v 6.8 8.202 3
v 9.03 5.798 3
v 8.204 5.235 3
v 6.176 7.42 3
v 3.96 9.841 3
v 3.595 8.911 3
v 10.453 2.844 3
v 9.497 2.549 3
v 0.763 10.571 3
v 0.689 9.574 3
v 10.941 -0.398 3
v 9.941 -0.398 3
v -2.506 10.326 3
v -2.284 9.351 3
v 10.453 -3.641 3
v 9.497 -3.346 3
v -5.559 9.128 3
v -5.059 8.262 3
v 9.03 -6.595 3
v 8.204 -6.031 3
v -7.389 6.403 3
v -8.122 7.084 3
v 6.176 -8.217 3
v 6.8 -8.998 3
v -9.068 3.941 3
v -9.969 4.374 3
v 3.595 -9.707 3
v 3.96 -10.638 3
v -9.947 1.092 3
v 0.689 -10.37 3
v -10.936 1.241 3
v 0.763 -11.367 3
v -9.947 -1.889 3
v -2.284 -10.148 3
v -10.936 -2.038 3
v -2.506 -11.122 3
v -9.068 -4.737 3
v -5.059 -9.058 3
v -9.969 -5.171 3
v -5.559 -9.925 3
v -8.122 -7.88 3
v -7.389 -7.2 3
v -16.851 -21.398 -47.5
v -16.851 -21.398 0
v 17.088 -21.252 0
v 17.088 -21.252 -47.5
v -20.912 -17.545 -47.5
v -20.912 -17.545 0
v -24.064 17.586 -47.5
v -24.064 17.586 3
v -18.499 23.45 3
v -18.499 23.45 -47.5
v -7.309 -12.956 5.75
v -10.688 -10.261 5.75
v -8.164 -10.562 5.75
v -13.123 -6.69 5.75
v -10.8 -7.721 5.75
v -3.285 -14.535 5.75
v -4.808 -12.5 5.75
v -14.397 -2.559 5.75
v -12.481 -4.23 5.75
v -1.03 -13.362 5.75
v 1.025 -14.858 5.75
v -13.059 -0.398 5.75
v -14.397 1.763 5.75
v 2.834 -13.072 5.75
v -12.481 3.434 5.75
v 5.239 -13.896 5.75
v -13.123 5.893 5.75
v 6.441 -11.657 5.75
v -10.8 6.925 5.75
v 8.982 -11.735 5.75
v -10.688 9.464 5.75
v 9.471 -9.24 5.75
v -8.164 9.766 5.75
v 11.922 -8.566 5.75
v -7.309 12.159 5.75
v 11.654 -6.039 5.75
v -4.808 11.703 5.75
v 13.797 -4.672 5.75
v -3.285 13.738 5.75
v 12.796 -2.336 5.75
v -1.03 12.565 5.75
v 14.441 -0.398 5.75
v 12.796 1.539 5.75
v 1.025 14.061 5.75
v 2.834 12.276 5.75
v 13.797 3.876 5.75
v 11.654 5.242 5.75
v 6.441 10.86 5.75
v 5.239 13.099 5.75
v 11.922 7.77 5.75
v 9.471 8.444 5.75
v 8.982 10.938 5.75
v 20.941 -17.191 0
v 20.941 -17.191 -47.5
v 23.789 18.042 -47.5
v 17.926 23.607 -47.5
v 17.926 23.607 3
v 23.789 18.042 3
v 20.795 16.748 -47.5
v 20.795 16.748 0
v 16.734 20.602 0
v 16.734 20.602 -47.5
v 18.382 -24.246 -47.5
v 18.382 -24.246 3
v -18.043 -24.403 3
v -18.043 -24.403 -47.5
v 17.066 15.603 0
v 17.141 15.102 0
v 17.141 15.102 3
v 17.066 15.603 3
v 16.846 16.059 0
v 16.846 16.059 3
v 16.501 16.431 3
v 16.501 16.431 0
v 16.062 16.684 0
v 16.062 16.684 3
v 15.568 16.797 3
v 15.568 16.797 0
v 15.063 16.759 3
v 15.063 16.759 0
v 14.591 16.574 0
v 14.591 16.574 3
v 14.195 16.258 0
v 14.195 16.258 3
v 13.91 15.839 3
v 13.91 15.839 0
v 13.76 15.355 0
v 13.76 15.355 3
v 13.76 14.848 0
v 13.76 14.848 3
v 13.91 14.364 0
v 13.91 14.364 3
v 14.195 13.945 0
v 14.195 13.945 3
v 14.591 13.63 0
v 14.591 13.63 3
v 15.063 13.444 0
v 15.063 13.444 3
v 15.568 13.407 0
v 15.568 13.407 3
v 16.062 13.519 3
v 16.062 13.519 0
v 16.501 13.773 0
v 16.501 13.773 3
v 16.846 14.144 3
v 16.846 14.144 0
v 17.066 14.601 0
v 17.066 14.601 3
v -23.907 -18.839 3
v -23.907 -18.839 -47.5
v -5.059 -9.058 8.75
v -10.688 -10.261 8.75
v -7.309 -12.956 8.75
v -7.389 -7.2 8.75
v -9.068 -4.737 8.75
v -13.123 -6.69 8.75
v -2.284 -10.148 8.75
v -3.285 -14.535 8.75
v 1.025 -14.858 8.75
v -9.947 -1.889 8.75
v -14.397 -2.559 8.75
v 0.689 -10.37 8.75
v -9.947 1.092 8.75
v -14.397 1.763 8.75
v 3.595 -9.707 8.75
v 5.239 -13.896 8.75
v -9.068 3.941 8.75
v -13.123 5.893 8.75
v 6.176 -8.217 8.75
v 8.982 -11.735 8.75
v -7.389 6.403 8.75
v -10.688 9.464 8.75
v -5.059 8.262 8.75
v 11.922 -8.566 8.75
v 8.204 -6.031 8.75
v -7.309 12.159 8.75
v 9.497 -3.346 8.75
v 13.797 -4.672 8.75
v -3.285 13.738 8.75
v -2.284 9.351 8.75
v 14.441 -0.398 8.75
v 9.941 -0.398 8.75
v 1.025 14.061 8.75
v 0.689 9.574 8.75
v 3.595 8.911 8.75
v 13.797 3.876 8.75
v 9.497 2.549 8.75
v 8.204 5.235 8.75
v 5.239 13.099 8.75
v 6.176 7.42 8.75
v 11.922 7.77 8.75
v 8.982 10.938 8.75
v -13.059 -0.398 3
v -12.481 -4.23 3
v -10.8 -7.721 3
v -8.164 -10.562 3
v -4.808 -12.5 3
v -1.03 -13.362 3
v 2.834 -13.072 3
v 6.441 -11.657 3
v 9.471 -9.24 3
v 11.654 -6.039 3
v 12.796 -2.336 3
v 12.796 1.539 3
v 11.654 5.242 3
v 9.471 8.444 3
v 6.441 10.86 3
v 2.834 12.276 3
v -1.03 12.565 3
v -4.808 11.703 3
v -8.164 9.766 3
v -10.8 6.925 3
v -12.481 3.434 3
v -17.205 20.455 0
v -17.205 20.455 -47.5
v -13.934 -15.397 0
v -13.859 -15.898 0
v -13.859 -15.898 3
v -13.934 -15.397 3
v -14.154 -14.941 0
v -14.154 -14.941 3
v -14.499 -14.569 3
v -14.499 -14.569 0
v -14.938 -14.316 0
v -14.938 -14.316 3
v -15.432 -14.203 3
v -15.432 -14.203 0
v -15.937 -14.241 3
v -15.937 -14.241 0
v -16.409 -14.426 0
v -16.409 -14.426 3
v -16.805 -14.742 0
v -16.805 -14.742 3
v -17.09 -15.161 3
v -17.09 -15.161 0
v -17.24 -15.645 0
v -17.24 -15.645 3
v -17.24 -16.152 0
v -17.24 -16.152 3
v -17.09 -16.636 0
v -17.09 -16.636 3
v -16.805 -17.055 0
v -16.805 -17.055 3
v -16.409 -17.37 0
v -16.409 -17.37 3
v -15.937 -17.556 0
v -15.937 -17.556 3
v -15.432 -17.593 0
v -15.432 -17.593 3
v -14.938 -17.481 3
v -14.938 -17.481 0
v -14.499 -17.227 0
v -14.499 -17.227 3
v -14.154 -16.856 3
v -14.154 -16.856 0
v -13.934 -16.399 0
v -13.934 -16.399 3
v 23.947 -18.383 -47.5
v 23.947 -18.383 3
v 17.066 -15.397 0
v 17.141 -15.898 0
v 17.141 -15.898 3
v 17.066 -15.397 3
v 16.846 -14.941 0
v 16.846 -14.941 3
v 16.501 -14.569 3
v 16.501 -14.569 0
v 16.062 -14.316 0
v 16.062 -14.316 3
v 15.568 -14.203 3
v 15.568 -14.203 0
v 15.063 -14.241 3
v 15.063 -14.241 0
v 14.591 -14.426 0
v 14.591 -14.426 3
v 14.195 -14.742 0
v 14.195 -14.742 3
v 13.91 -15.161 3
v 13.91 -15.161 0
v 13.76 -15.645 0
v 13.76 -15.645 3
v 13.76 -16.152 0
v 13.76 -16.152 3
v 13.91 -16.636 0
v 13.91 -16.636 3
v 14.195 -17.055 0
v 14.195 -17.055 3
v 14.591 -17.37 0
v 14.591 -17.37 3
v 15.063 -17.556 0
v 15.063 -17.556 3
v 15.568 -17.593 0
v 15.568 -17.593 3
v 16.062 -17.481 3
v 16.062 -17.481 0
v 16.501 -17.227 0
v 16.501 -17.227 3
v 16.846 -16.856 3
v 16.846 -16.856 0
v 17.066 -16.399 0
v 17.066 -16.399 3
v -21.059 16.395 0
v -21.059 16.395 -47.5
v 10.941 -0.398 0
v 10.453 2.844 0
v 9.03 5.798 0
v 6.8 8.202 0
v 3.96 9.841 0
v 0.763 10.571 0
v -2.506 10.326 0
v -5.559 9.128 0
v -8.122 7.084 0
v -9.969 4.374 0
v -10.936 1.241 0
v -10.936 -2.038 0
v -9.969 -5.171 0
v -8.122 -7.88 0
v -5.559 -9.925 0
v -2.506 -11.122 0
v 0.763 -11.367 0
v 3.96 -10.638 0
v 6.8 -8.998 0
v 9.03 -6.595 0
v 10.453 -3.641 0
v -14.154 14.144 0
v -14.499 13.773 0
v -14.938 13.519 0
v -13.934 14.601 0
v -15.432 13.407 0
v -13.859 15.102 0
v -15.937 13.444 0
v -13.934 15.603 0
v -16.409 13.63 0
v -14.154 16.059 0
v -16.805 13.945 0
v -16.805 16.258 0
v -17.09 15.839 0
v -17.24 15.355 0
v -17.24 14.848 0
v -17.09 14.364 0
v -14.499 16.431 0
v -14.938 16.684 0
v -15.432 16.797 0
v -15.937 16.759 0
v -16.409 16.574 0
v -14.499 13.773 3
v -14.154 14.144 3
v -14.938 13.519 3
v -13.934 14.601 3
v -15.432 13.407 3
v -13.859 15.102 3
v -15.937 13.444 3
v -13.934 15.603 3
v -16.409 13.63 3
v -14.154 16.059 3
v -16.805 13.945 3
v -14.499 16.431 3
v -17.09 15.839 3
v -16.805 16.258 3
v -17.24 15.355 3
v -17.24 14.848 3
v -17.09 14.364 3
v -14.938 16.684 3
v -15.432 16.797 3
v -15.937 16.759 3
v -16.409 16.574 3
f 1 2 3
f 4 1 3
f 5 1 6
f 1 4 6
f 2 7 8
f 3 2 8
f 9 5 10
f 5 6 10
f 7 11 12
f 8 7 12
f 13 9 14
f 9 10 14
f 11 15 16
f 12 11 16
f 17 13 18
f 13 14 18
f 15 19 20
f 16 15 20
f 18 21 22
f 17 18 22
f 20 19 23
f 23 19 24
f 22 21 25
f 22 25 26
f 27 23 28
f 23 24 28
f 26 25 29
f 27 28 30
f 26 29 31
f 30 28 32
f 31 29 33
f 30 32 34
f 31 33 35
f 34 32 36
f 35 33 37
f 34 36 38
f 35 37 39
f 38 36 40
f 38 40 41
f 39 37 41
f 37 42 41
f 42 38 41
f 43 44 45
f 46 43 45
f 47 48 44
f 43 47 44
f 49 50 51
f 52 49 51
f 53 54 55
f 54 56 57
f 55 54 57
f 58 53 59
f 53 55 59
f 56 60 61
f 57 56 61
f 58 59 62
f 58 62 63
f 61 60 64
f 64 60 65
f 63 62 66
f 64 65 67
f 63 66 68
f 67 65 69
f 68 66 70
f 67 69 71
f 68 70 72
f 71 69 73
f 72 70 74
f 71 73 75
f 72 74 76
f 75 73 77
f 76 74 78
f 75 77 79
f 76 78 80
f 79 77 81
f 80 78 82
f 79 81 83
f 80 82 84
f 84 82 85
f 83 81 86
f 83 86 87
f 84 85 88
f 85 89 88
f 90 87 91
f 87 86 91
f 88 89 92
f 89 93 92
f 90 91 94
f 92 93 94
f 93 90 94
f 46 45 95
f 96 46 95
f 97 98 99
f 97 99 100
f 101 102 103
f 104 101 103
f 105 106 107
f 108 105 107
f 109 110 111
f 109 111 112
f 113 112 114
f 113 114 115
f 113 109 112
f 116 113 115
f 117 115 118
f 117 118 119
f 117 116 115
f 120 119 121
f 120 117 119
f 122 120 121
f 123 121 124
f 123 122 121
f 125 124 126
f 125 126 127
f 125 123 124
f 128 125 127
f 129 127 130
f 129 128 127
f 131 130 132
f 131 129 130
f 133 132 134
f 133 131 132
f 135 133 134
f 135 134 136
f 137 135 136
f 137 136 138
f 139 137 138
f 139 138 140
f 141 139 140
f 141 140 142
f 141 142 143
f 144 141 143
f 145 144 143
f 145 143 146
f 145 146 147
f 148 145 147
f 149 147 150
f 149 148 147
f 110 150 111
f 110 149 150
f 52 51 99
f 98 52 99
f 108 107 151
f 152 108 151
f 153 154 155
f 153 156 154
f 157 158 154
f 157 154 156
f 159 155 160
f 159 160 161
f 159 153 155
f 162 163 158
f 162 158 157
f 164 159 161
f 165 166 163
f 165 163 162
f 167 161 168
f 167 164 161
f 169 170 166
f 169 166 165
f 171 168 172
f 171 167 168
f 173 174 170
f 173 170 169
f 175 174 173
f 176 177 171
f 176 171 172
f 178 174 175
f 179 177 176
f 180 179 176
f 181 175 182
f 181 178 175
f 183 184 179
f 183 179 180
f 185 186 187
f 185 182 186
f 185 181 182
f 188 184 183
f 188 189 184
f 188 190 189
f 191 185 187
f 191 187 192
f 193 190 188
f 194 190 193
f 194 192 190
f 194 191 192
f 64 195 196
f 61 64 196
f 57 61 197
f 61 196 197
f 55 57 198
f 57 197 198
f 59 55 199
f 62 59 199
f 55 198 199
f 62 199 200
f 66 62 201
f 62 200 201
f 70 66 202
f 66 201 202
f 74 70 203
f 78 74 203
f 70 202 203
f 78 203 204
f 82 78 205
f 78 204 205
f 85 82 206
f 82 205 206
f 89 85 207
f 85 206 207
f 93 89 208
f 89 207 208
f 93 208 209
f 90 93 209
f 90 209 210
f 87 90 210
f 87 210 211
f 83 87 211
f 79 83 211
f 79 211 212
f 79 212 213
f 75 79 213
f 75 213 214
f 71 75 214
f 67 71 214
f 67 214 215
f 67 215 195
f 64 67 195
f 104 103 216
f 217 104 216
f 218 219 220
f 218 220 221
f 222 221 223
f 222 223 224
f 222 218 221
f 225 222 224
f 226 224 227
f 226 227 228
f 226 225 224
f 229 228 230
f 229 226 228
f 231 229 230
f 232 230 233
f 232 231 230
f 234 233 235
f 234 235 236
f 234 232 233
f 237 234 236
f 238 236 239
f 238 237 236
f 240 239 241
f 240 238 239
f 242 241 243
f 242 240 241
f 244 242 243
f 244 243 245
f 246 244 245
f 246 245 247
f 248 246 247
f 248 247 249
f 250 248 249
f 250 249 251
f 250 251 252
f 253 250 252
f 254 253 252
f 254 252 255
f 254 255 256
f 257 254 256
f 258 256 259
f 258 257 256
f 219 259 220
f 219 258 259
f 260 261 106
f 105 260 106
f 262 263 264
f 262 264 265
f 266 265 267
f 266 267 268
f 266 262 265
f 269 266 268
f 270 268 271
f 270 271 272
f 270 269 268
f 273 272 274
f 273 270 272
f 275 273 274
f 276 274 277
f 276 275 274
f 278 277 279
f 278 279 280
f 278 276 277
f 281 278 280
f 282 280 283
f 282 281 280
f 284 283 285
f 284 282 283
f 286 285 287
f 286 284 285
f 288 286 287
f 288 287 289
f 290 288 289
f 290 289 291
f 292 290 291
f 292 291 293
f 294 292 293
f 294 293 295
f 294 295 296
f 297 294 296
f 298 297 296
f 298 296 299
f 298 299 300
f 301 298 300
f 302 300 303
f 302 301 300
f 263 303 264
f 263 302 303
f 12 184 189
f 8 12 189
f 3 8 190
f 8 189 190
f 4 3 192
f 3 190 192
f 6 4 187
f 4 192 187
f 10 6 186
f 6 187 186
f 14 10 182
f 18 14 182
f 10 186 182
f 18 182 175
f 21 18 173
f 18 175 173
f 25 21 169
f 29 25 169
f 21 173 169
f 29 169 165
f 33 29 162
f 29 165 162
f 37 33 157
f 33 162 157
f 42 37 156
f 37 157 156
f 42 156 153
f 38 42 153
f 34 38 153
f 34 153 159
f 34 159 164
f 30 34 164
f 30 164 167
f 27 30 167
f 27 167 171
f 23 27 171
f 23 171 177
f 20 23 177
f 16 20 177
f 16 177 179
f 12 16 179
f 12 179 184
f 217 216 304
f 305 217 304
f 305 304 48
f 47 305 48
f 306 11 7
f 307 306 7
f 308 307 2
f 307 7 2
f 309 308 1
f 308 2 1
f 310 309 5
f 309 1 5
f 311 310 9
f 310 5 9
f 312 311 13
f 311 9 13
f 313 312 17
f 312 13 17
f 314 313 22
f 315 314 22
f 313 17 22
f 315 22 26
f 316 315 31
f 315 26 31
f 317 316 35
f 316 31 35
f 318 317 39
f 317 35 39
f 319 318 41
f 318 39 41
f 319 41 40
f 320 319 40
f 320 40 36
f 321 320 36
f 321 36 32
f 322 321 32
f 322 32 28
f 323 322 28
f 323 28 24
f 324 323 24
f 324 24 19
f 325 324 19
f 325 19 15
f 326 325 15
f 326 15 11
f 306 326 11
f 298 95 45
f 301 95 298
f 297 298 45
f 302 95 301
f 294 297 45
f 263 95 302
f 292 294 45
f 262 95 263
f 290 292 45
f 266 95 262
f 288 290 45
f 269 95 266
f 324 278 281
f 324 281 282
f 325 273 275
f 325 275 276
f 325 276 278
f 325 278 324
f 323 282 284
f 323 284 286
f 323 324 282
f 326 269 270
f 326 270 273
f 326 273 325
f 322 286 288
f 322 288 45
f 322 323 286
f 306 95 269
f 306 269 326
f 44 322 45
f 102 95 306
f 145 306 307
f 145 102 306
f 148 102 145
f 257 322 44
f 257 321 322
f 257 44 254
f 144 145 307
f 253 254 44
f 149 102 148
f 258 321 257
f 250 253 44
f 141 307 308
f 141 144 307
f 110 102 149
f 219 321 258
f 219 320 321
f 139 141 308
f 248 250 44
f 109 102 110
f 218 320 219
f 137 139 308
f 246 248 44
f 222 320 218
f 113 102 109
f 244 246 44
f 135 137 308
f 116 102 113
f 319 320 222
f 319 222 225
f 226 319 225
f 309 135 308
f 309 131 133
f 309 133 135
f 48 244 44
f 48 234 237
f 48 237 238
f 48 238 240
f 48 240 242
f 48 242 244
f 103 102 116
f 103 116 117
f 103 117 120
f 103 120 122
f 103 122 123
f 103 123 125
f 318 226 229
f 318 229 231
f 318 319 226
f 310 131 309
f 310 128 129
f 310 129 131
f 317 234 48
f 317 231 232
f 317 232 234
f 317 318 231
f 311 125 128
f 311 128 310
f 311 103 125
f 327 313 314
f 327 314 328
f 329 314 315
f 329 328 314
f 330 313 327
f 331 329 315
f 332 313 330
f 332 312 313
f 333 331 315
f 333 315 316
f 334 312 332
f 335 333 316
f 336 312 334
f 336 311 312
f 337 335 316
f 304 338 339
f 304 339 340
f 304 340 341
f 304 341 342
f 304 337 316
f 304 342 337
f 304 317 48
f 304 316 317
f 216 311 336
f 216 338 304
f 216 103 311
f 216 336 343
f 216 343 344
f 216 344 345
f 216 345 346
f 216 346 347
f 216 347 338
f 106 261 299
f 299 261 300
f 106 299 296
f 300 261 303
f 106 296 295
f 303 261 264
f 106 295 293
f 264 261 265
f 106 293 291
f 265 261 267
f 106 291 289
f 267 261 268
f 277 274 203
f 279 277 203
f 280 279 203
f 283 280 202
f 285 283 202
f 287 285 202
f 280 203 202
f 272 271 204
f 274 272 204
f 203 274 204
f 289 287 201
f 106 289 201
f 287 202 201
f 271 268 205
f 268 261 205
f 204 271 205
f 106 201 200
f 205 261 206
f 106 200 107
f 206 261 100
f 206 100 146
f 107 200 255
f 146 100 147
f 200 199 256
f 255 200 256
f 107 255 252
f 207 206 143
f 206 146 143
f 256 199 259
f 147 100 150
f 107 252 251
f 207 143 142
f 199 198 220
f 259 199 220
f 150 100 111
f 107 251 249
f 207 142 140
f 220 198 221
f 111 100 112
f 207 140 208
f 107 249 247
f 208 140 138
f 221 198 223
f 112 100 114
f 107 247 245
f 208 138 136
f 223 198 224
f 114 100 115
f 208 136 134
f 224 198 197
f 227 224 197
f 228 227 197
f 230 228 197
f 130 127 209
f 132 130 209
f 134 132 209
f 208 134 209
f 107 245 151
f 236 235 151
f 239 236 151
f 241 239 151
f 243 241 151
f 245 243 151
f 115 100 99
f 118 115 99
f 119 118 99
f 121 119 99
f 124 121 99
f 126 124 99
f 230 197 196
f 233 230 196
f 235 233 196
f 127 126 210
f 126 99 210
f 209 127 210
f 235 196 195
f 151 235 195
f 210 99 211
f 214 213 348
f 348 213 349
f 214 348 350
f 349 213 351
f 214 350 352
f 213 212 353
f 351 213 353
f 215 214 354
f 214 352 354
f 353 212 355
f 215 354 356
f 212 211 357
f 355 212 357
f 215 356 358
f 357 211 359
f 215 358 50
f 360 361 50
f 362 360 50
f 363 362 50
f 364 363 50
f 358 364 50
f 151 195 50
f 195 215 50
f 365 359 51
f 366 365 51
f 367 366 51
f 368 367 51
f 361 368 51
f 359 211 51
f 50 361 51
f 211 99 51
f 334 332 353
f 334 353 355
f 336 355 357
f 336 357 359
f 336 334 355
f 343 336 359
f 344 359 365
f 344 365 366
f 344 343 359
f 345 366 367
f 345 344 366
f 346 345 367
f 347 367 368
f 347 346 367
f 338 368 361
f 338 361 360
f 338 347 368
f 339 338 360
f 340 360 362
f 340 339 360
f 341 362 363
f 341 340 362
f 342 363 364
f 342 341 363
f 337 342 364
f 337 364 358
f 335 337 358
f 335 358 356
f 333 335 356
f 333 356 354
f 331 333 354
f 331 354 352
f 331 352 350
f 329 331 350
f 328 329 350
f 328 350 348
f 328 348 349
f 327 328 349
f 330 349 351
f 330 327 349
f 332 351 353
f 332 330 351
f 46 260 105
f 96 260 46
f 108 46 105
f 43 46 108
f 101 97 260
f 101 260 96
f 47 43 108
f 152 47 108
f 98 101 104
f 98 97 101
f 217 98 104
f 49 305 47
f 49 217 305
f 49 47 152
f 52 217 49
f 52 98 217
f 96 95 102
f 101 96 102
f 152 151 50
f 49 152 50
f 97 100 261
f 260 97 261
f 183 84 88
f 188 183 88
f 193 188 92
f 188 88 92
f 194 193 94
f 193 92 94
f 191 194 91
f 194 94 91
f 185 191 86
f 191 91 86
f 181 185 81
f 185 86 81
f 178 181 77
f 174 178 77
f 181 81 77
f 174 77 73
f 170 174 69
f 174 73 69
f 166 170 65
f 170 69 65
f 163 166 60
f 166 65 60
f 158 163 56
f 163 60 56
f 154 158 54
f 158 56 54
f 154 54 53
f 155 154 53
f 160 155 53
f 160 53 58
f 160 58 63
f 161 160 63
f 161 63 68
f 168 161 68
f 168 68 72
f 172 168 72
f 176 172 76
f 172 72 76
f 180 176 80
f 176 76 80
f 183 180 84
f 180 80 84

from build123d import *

# Parameters (mm, degrees)
CROQUIS1_R              = 1.7
SALIENTE_EXTRUIR1_DEPTH = 3
CROQUIS17_R             = 11
CORTAR_EXTRUIR7_DEPTH   = 30
CROQUIS19_R             = 13
SALIENTE_EXTRUIR3_DEPTH = 7.25
CROQUIS20_R             = 10
CORTAR_EXTRUIR8_DEPTH   = 14
CORTAR_EXTRUIR9_START   = -1.5
CROQUIS22_R             = 13
CORTAR_EXTRUIR9_DEPTH   = 1.5
SALIENTE_EXTRUIR4_START = -3
CROQUIS23_R             = 14.5
CROQUIS23_R_2           = 13
SALIENTE_EXTRUIR4_DEPTH = 3
SALIENTE_EXTRUIR6_DEPTH = 50.5


with BuildPart() as part:
    # Croquis1 → Saliente-Extruir1 (new body)
    with BuildSketch(Plane.XY):
        Polygon((-20.912159123, -17.544678887), (-21.058605733, 16.394660941), (-17.205052342, 20.455321113), (16.734287486, 20.601767722), (20.794947658, 16.748214331), (20.941394267, -17.191125497), (17.087840877, -21.251785669), (-16.851498951, -21.398232278), align=None)
        with Locations((-15.558605733, 15.101767722)):
            Circle(CROQUIS1_R, mode=Mode.SUBTRACT)
        with Locations((15.441394267, 15.101767722)):
            Circle(CROQUIS1_R, mode=Mode.SUBTRACT)
        with Locations((15.441394267, -15.898232278)):
            Circle(CROQUIS1_R, mode=Mode.SUBTRACT)
        with Locations((-15.558605733, -15.898232278)):
            Circle(CROQUIS1_R, mode=Mode.SUBTRACT)
    extrude(amount=SALIENTE_EXTRUIR1_DEPTH)

    # Croquis17 → Cortar-Extruir7 (cut)
    with BuildSketch(Plane.XY.offset(3)):
        with Locations((-0.058605733, -0.398232278)):
            Circle(CROQUIS17_R)
    extrude(amount=-CORTAR_EXTRUIR7_DEPTH, mode=Mode.SUBTRACT)

    # Croquis19 → Saliente-Extruir3 (add)
    with BuildSketch(Plane.XY.offset(3)):
        with Locations(Location((-0.058605733, -0.398232278, 0), (0, 0, 180))):
            Circle(CROQUIS19_R)
    extrude(amount=SALIENTE_EXTRUIR3_DEPTH)

    # Croquis20 → Cortar-Extruir8 (cut)
    with BuildSketch(Plane.XY.offset(10.25)):
        with Locations((-0.058605733, -0.398232278)):
            Circle(CROQUIS20_R)
    extrude(amount=-CORTAR_EXTRUIR8_DEPTH, mode=Mode.SUBTRACT)

    # Croquis22 → Cortar-Extruir9 (cut)
    with BuildSketch(Plane.XY.offset(10.25).offset(CORTAR_EXTRUIR9_START)):
        with Locations(Location((-0.058605733, -0.398232278, 0), (0, 0, 180))):
            Circle(CROQUIS22_R)
    extrude(amount=CORTAR_EXTRUIR9_DEPTH, mode=Mode.SUBTRACT)

    # Croquis23 → Saliente-Extruir4 (add)
    with BuildSketch(Plane.XY.offset(8.75).offset(SALIENTE_EXTRUIR4_START)):
        with Locations((-0.058605733, -0.398232278)):
            Circle(CROQUIS23_R)
        with Locations(Location((-0.058605733, -0.398232278, 0), (0, 0, 180))):
            Circle(CROQUIS23_R_2, mode=Mode.SUBTRACT)
    extrude(amount=SALIENTE_EXTRUIR4_DEPTH)

    # Croquis25 → Saliente-Extruir6 (add)
    with BuildSketch(Plane.XY.offset(3)):
        Polygon((-24.063774758, 17.586122209), (-18.499196808, 23.44976487), (17.925748755, 23.606936748), (23.789391415, 18.042358797), (23.946563293, -18.382586765), (18.381985343, -24.246229426), (-18.04296022, -24.403401304), (-23.906602881, -18.838823353), align=None)
        Polygon((-20.912159123, -17.544678887), (-16.851498951, -21.398232278), (17.087840877, -21.251785669), (20.941394267, -17.191125497), (20.794947658, 16.748214331), (16.734287486, 20.601767722), (-17.205052342, 20.455321113), (-21.058605733, 16.394660941), align=None, mode=Mode.SUBTRACT)
    extrude(amount=-SALIENTE_EXTRUIR6_DEPTH)


solid = part.part
